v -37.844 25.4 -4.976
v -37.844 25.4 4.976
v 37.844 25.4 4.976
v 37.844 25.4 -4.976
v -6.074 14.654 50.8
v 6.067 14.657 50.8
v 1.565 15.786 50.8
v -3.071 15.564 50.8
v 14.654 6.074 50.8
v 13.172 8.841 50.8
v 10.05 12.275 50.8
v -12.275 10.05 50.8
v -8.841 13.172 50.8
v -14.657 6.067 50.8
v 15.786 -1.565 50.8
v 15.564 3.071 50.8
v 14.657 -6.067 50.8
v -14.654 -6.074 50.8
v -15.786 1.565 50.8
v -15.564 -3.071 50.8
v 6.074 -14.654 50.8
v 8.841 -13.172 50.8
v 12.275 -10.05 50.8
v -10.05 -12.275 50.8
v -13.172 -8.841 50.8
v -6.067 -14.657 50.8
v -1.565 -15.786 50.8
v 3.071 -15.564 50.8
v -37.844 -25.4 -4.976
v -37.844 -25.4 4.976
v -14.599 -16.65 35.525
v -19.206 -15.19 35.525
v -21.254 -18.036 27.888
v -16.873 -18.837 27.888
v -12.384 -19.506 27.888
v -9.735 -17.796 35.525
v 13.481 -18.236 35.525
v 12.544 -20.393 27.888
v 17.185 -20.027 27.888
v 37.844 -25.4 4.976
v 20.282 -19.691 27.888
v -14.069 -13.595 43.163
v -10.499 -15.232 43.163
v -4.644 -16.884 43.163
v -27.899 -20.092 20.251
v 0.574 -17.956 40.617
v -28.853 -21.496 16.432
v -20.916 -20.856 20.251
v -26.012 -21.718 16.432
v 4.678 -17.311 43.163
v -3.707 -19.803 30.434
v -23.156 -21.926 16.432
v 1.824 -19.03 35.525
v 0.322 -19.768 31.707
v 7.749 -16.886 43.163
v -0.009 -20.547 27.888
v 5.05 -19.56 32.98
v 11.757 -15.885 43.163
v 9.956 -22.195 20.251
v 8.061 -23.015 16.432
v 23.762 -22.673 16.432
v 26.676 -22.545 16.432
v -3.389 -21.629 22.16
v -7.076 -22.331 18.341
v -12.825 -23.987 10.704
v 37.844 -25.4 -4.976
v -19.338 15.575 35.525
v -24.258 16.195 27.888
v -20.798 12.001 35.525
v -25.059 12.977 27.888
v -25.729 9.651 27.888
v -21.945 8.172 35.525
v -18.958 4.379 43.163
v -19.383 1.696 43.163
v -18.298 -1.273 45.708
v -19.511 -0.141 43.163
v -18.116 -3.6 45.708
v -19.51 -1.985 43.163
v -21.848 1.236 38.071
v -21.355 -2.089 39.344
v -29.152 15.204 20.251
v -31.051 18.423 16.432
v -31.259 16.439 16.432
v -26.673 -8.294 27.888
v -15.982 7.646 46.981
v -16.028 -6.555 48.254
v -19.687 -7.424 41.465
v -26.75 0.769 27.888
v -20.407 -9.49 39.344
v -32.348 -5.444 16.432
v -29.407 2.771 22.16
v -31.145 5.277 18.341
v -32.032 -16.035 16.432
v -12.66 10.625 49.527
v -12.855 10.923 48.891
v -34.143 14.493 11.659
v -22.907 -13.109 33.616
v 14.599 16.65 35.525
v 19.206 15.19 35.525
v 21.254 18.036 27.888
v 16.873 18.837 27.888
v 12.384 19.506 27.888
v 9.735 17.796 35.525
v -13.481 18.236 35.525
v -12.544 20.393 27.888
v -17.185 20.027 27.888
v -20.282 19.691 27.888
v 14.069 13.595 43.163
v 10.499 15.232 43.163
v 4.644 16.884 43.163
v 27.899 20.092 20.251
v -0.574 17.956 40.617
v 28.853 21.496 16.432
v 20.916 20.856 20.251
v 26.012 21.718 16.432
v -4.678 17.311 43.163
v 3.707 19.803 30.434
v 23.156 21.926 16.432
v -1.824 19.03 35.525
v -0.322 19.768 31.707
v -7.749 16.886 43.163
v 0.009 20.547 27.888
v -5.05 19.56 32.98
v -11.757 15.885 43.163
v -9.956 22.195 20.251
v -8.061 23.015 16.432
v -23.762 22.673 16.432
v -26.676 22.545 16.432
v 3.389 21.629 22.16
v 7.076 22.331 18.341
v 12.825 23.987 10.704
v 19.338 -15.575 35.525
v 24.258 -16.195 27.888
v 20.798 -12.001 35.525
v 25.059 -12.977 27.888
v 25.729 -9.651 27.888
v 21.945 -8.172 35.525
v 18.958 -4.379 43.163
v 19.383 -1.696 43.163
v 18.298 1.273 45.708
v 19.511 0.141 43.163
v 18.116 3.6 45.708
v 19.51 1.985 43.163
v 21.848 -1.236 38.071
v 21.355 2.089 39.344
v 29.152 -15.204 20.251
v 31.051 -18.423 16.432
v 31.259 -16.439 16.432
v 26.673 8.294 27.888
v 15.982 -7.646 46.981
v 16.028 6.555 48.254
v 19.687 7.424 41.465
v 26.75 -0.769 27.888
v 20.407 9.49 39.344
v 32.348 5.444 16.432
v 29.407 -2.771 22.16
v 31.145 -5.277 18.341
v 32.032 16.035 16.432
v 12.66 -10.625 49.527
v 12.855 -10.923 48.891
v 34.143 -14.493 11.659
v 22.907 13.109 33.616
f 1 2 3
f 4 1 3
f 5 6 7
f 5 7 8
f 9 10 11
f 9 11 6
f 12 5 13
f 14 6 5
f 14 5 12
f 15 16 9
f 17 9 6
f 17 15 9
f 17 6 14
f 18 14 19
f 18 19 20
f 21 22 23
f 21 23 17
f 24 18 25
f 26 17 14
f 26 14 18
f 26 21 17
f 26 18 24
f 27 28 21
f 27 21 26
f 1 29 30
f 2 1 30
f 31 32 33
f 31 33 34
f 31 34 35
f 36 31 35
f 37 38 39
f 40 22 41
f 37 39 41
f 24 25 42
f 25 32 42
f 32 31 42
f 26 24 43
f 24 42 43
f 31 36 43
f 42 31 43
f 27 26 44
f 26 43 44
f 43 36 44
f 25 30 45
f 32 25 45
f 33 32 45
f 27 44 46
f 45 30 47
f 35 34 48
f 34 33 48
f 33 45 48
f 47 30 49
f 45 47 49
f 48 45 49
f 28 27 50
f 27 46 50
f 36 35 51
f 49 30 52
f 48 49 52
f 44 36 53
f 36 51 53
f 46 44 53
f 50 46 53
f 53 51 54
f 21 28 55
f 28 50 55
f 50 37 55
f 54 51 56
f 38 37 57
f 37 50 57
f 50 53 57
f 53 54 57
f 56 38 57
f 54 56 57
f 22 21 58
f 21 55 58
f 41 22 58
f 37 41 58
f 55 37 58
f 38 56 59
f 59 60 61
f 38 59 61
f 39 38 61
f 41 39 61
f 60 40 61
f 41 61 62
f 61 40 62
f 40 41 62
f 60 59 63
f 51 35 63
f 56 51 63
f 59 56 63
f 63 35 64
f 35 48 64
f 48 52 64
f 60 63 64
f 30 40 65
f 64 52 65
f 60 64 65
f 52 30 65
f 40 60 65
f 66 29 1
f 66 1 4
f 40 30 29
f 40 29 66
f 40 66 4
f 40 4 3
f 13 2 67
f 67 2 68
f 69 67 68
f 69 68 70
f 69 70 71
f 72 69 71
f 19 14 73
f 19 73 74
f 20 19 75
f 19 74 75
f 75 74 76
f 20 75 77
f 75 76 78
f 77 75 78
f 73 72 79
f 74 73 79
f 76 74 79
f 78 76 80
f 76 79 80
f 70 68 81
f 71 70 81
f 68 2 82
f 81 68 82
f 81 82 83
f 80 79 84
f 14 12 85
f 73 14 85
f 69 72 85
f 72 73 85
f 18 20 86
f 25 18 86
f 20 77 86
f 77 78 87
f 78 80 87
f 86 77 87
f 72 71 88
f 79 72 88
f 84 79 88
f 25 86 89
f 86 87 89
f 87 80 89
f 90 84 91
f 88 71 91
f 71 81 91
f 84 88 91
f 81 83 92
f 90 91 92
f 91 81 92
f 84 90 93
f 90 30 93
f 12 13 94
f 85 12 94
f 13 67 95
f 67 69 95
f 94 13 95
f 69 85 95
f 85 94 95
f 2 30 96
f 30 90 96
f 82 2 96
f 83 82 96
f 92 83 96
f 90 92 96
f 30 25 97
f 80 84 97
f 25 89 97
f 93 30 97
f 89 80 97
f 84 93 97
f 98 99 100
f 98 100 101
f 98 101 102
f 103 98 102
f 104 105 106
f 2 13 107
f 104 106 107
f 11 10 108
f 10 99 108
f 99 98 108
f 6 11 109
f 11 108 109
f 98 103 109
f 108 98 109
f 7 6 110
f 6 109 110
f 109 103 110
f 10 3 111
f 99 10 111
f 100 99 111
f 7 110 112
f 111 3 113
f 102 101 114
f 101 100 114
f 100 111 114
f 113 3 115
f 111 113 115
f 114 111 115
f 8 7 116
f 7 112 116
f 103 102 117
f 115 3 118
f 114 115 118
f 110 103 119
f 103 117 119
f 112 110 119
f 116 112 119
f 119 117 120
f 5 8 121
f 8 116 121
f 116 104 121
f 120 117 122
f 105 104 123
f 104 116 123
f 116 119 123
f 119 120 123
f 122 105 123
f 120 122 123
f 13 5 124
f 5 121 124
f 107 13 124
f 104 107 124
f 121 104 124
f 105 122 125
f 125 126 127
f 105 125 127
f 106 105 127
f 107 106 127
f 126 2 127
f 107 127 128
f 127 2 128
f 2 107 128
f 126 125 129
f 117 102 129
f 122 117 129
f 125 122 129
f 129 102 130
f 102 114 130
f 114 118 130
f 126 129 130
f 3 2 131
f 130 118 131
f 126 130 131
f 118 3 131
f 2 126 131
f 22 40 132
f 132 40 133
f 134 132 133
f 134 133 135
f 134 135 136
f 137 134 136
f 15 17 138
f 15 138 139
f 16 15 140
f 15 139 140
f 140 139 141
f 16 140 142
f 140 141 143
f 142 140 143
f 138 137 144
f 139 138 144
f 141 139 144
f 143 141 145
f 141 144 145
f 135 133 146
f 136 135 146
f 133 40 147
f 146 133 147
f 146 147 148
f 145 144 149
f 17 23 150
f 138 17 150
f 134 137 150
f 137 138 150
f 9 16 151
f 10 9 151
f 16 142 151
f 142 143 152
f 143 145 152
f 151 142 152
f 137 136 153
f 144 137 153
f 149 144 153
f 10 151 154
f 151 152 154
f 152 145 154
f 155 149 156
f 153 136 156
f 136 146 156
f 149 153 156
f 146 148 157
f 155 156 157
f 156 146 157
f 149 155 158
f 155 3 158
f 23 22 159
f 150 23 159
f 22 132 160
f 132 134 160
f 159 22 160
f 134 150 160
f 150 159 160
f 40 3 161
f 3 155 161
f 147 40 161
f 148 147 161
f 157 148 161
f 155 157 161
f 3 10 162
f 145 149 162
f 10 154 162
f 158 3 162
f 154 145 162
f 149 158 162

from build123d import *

# Parameters (mm, degrees)
F0_W      = 75.6886824965
F0_H      = 9.952143766
F1_DEPTH  = 25.4
F1_FACE_W = 75.6886824965
F1_FACE_H = 50.8


# Not quite as in the source:
# - the arcs of a loft's sections are written as splines that run evenly, so that the points pair up as in the source's solid


with BuildPart() as f1:
    # F0 (on Front) → F1 (new body, symmetric)
    with BuildSketch(Plane.XZ):
        Rectangle(F0_W, F0_H)
    extrude(amount=F1_DEPTH, both=True)

    # F3 (on offset) → F4 section 0
    with BuildSketch(Plane.XY.offset(50.8)):
        with BuildLine():
            add(Edge.make_bspline(
                [(13.172476733, 8.8409759024), (12.0151956936, 10.5652490746), (10.5155256838, 12.0587368806), (7.0574476007, 14.3590337045), (5.1004001334, 15.1649376538), (1.0252670866, 15.9667856178), (-1.0912151021, 15.9624141396), (-5.1630010474, 15.1437391601), (-7.1167027301, 14.3297577724), (-8.8409759024, 13.172476733)],
                knots=[0, 0, 0, 0, 0.25, 0.25, 0.5, 0.5, 0.75, 0.75, 1, 1, 1, 1], degree=3))
            add(Edge.make_bspline(
                [(-8.8409759024, 13.172476733), (-10.5652490746, 12.0151956936), (-12.0587368806, 10.5155256838), (-14.3590337045, 7.0574476007), (-15.1649376538, 5.1004001334), (-15.9667856178, 1.0252670866), (-15.9624141396, -1.0912151021), (-15.1437391601, -5.1630010474), (-14.3297577724, -7.1167027301), (-13.172476733, -8.8409759024)],
                knots=[0, 0, 0, 0, 0.25, 0.25, 0.5, 0.5, 0.75, 0.75, 1, 1, 1, 1], degree=3))
            add(Edge.make_bspline(
                [(-13.172476733, -8.8409759024), (-12.0151956936, -10.5652490746), (-10.5155256838, -12.0587368806), (-7.0574476007, -14.3590337045), (-5.1004001334, -15.1649376538), (-1.0252670866, -15.9667856178), (1.0912151021, -15.9624141396), (5.1630010474, -15.1437391601), (7.1167027301, -14.3297577724), (8.8409759024, -13.172476733)],
                knots=[0, 0, 0, 0, 0.25, 0.25, 0.5, 0.5, 0.75, 0.75, 1, 1, 1, 1], degree=3))
            add(Edge.make_bspline(
                [(8.8409759024, -13.172476733), (10.5652490746, -12.0151956936), (12.0587368806, -10.5155256838), (14.3590337045, -7.0574476007), (15.1649376538, -5.1004001334), (15.9667856178, -1.0252670866), (15.9624141396, 1.0912151021), (15.1437391601, 5.1630010474), (14.3297577724, 7.1167027301), (13.172476733, 8.8409759024)],
                knots=[0, 0, 0, 0, 0.25, 0.25, 0.5, 0.5, 0.75, 0.75, 1, 1, 1, 1], degree=3))
        make_face()
    # F1_face (on face) → F4 section 1
    with BuildSketch(Plane.XY.offset(4.976071883)):
        Rectangle(F1_FACE_W, F1_FACE_H)
    loft(ruled=True)


solid = f1.part
